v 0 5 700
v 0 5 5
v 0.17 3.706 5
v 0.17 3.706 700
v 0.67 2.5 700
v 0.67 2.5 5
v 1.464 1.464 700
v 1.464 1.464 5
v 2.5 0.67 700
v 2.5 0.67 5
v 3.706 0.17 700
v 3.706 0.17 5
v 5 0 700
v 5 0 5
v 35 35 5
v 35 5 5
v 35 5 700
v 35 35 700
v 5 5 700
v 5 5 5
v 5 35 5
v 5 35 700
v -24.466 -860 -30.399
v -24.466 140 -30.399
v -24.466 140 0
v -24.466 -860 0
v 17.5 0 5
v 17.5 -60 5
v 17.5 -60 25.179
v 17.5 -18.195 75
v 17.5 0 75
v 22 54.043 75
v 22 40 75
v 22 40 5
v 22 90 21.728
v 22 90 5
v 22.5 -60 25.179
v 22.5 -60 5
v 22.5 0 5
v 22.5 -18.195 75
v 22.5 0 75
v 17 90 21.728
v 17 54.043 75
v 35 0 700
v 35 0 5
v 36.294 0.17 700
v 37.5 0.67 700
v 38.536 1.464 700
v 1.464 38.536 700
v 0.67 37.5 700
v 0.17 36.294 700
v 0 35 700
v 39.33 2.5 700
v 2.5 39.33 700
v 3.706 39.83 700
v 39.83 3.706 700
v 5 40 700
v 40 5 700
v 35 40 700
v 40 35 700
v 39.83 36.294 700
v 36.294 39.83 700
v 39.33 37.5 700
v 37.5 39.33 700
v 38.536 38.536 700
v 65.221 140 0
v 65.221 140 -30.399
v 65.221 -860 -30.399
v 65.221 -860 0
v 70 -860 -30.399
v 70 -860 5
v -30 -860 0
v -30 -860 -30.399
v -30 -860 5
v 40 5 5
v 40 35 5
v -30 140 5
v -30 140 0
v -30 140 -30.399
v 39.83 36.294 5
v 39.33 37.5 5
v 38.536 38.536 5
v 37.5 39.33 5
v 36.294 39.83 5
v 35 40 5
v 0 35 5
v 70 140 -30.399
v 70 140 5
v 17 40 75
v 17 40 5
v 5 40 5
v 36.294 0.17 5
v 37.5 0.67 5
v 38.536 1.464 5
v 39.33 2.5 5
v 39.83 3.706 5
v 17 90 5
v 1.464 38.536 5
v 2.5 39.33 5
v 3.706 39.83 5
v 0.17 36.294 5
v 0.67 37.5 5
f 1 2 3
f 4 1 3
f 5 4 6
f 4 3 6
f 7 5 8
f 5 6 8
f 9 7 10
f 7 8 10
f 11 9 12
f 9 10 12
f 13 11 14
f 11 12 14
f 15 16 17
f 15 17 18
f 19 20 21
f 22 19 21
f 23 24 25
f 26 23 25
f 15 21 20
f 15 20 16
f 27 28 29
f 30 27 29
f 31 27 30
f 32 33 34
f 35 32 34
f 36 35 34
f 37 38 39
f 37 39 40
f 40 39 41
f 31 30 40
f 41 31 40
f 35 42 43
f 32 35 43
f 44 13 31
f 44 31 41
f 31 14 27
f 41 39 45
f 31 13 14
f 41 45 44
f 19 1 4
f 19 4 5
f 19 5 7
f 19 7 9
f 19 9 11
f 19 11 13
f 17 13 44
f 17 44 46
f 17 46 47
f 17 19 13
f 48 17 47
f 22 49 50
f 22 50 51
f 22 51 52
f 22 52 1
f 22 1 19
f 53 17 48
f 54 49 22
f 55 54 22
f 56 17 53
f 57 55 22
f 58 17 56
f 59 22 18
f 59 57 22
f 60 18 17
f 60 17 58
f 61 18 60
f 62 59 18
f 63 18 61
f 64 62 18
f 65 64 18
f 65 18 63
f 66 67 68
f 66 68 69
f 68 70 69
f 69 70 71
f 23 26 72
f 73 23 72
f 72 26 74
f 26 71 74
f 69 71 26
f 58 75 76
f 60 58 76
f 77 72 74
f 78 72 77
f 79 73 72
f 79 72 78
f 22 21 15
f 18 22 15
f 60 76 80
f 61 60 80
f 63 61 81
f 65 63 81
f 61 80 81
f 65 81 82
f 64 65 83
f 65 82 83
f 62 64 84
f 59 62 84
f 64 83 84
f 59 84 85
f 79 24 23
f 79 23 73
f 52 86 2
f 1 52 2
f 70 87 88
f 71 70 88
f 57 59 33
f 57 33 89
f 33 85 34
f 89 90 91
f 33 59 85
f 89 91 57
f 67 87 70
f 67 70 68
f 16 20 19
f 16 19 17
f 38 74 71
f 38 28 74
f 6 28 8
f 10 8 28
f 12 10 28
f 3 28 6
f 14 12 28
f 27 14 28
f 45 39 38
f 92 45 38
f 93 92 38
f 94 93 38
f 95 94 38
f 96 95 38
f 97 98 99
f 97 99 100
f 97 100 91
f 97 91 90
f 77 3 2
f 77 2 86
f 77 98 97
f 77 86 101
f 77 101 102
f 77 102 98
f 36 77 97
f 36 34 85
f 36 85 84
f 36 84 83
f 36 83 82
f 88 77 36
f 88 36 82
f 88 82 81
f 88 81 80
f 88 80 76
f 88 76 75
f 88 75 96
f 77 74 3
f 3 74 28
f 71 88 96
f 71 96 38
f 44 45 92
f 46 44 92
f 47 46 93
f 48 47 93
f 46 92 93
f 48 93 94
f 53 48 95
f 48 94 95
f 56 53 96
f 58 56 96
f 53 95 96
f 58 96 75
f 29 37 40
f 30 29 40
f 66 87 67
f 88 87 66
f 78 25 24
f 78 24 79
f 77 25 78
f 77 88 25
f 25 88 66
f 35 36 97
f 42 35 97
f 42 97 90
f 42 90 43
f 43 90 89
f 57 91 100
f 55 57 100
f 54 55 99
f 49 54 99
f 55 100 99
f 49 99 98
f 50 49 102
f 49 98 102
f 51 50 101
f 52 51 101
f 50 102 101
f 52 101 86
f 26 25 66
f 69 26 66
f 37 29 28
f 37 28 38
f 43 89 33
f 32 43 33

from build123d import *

# Parameters (mm, degrees)
F0_W      = 30
F0_H      = 30
F1_DEPTH  = 700
F2_W      = 100
F2_H      = 1000
F3_DEPTH  = 5
F4_W      = 4.7787350416
F4_H      = 30.3992684931
F4_W_2    = 5.5340740085
F5_DEPTH  = 1000
F7_DEPTH  = 50
F9_DEPTH  = 25
F10_W     = 5
F10_H     = 70
F11_DEPTH = 60
F13_DEPTH = 25


with BuildPart() as f1:
    # F0 (on Top) → F1 (new body)
    with BuildSketch(Plane.XY):
        with BuildLine():
            ThreePointArc((0, 5), (1.4644660941, 1.4644660941), (5, 0))
            Line((5, 0), (35, 0))
            ThreePointArc((35, 0), (38.5355339059, 1.4644660941), (40, 5))
            Line((40, 5), (40, 35))
            ThreePointArc((40, 35), (38.5355339059, 38.5355339059), (35, 40))
            Line((35, 40), (5, 40))
            ThreePointArc((5, 40), (1.4644660941, 38.5355339059), (0, 35))
            Line((0, 35), (0, 5))
        make_face()
        with Locations((20, 20)):
            Rectangle(F0_W, F0_H, mode=Mode.SUBTRACT)
    extrude(amount=F1_DEPTH)

    # F2 (on Top) → F3 (join)
    with BuildSketch(Plane.XY):
        with Locations((20, -360)):
            Rectangle(F2_W, F2_H)
    extrude(amount=F3_DEPTH)

    # F4 (on face) → F5 (join)
    with BuildSketch(Plane(origin=(0, 140, 0), x_dir=(-1, 0, 0), z_dir=(0, 1, 0))):
        with Locations((-67.6106324792, -15.1996342465)):
            Rectangle(F4_W, F4_H)
        with Locations((27.2329629958, -15.1996342465)):
            Rectangle(F4_W_2, F4_H)
    extrude(amount=-F5_DEPTH)

    # F6 (on face) → F7 (join)
    with BuildSketch(Plane(origin=(0, 40, 0), x_dir=(-1, 0, 0), z_dir=(0, 1, 0))):
        Polygon((-17, 5), (-17, 75), (-22, 75), (-22, 5), (-20, 5), align=None)
    extrude(amount=F7_DEPTH)

    # F8 (on face) → F9 (cut)
    with BuildSketch(Plane(origin=(17, 0, 0), x_dir=(0, -1, 0), z_dir=(-1, 0, 0))):
        Polygon((-90, 21.7283517122), (-54.0427826345, 75), (-54.0427826345, 81.2046378851), (-94.0335020423, 81.2046378851), (-94.0335020423, 21.7283517122), align=None)
    extrude(amount=-F9_DEPTH, mode=Mode.SUBTRACT)

    # F10 (on face) → F11 (join)
    with BuildSketch(Plane.XZ):
        with Locations((20, 40)):
            Rectangle(F10_W, F10_H)
    extrude(amount=F11_DEPTH)

    # F12 (on face) → F13 (cut)
    with BuildSketch(Plane.YZ.offset(22.5)):
        Polygon((-60, 25.1793347407), (-18.1954981559, 75), (-60, 75), align=None)
    extrude(amount=-F13_DEPTH, mode=Mode.SUBTRACT)


solid = f1.part
